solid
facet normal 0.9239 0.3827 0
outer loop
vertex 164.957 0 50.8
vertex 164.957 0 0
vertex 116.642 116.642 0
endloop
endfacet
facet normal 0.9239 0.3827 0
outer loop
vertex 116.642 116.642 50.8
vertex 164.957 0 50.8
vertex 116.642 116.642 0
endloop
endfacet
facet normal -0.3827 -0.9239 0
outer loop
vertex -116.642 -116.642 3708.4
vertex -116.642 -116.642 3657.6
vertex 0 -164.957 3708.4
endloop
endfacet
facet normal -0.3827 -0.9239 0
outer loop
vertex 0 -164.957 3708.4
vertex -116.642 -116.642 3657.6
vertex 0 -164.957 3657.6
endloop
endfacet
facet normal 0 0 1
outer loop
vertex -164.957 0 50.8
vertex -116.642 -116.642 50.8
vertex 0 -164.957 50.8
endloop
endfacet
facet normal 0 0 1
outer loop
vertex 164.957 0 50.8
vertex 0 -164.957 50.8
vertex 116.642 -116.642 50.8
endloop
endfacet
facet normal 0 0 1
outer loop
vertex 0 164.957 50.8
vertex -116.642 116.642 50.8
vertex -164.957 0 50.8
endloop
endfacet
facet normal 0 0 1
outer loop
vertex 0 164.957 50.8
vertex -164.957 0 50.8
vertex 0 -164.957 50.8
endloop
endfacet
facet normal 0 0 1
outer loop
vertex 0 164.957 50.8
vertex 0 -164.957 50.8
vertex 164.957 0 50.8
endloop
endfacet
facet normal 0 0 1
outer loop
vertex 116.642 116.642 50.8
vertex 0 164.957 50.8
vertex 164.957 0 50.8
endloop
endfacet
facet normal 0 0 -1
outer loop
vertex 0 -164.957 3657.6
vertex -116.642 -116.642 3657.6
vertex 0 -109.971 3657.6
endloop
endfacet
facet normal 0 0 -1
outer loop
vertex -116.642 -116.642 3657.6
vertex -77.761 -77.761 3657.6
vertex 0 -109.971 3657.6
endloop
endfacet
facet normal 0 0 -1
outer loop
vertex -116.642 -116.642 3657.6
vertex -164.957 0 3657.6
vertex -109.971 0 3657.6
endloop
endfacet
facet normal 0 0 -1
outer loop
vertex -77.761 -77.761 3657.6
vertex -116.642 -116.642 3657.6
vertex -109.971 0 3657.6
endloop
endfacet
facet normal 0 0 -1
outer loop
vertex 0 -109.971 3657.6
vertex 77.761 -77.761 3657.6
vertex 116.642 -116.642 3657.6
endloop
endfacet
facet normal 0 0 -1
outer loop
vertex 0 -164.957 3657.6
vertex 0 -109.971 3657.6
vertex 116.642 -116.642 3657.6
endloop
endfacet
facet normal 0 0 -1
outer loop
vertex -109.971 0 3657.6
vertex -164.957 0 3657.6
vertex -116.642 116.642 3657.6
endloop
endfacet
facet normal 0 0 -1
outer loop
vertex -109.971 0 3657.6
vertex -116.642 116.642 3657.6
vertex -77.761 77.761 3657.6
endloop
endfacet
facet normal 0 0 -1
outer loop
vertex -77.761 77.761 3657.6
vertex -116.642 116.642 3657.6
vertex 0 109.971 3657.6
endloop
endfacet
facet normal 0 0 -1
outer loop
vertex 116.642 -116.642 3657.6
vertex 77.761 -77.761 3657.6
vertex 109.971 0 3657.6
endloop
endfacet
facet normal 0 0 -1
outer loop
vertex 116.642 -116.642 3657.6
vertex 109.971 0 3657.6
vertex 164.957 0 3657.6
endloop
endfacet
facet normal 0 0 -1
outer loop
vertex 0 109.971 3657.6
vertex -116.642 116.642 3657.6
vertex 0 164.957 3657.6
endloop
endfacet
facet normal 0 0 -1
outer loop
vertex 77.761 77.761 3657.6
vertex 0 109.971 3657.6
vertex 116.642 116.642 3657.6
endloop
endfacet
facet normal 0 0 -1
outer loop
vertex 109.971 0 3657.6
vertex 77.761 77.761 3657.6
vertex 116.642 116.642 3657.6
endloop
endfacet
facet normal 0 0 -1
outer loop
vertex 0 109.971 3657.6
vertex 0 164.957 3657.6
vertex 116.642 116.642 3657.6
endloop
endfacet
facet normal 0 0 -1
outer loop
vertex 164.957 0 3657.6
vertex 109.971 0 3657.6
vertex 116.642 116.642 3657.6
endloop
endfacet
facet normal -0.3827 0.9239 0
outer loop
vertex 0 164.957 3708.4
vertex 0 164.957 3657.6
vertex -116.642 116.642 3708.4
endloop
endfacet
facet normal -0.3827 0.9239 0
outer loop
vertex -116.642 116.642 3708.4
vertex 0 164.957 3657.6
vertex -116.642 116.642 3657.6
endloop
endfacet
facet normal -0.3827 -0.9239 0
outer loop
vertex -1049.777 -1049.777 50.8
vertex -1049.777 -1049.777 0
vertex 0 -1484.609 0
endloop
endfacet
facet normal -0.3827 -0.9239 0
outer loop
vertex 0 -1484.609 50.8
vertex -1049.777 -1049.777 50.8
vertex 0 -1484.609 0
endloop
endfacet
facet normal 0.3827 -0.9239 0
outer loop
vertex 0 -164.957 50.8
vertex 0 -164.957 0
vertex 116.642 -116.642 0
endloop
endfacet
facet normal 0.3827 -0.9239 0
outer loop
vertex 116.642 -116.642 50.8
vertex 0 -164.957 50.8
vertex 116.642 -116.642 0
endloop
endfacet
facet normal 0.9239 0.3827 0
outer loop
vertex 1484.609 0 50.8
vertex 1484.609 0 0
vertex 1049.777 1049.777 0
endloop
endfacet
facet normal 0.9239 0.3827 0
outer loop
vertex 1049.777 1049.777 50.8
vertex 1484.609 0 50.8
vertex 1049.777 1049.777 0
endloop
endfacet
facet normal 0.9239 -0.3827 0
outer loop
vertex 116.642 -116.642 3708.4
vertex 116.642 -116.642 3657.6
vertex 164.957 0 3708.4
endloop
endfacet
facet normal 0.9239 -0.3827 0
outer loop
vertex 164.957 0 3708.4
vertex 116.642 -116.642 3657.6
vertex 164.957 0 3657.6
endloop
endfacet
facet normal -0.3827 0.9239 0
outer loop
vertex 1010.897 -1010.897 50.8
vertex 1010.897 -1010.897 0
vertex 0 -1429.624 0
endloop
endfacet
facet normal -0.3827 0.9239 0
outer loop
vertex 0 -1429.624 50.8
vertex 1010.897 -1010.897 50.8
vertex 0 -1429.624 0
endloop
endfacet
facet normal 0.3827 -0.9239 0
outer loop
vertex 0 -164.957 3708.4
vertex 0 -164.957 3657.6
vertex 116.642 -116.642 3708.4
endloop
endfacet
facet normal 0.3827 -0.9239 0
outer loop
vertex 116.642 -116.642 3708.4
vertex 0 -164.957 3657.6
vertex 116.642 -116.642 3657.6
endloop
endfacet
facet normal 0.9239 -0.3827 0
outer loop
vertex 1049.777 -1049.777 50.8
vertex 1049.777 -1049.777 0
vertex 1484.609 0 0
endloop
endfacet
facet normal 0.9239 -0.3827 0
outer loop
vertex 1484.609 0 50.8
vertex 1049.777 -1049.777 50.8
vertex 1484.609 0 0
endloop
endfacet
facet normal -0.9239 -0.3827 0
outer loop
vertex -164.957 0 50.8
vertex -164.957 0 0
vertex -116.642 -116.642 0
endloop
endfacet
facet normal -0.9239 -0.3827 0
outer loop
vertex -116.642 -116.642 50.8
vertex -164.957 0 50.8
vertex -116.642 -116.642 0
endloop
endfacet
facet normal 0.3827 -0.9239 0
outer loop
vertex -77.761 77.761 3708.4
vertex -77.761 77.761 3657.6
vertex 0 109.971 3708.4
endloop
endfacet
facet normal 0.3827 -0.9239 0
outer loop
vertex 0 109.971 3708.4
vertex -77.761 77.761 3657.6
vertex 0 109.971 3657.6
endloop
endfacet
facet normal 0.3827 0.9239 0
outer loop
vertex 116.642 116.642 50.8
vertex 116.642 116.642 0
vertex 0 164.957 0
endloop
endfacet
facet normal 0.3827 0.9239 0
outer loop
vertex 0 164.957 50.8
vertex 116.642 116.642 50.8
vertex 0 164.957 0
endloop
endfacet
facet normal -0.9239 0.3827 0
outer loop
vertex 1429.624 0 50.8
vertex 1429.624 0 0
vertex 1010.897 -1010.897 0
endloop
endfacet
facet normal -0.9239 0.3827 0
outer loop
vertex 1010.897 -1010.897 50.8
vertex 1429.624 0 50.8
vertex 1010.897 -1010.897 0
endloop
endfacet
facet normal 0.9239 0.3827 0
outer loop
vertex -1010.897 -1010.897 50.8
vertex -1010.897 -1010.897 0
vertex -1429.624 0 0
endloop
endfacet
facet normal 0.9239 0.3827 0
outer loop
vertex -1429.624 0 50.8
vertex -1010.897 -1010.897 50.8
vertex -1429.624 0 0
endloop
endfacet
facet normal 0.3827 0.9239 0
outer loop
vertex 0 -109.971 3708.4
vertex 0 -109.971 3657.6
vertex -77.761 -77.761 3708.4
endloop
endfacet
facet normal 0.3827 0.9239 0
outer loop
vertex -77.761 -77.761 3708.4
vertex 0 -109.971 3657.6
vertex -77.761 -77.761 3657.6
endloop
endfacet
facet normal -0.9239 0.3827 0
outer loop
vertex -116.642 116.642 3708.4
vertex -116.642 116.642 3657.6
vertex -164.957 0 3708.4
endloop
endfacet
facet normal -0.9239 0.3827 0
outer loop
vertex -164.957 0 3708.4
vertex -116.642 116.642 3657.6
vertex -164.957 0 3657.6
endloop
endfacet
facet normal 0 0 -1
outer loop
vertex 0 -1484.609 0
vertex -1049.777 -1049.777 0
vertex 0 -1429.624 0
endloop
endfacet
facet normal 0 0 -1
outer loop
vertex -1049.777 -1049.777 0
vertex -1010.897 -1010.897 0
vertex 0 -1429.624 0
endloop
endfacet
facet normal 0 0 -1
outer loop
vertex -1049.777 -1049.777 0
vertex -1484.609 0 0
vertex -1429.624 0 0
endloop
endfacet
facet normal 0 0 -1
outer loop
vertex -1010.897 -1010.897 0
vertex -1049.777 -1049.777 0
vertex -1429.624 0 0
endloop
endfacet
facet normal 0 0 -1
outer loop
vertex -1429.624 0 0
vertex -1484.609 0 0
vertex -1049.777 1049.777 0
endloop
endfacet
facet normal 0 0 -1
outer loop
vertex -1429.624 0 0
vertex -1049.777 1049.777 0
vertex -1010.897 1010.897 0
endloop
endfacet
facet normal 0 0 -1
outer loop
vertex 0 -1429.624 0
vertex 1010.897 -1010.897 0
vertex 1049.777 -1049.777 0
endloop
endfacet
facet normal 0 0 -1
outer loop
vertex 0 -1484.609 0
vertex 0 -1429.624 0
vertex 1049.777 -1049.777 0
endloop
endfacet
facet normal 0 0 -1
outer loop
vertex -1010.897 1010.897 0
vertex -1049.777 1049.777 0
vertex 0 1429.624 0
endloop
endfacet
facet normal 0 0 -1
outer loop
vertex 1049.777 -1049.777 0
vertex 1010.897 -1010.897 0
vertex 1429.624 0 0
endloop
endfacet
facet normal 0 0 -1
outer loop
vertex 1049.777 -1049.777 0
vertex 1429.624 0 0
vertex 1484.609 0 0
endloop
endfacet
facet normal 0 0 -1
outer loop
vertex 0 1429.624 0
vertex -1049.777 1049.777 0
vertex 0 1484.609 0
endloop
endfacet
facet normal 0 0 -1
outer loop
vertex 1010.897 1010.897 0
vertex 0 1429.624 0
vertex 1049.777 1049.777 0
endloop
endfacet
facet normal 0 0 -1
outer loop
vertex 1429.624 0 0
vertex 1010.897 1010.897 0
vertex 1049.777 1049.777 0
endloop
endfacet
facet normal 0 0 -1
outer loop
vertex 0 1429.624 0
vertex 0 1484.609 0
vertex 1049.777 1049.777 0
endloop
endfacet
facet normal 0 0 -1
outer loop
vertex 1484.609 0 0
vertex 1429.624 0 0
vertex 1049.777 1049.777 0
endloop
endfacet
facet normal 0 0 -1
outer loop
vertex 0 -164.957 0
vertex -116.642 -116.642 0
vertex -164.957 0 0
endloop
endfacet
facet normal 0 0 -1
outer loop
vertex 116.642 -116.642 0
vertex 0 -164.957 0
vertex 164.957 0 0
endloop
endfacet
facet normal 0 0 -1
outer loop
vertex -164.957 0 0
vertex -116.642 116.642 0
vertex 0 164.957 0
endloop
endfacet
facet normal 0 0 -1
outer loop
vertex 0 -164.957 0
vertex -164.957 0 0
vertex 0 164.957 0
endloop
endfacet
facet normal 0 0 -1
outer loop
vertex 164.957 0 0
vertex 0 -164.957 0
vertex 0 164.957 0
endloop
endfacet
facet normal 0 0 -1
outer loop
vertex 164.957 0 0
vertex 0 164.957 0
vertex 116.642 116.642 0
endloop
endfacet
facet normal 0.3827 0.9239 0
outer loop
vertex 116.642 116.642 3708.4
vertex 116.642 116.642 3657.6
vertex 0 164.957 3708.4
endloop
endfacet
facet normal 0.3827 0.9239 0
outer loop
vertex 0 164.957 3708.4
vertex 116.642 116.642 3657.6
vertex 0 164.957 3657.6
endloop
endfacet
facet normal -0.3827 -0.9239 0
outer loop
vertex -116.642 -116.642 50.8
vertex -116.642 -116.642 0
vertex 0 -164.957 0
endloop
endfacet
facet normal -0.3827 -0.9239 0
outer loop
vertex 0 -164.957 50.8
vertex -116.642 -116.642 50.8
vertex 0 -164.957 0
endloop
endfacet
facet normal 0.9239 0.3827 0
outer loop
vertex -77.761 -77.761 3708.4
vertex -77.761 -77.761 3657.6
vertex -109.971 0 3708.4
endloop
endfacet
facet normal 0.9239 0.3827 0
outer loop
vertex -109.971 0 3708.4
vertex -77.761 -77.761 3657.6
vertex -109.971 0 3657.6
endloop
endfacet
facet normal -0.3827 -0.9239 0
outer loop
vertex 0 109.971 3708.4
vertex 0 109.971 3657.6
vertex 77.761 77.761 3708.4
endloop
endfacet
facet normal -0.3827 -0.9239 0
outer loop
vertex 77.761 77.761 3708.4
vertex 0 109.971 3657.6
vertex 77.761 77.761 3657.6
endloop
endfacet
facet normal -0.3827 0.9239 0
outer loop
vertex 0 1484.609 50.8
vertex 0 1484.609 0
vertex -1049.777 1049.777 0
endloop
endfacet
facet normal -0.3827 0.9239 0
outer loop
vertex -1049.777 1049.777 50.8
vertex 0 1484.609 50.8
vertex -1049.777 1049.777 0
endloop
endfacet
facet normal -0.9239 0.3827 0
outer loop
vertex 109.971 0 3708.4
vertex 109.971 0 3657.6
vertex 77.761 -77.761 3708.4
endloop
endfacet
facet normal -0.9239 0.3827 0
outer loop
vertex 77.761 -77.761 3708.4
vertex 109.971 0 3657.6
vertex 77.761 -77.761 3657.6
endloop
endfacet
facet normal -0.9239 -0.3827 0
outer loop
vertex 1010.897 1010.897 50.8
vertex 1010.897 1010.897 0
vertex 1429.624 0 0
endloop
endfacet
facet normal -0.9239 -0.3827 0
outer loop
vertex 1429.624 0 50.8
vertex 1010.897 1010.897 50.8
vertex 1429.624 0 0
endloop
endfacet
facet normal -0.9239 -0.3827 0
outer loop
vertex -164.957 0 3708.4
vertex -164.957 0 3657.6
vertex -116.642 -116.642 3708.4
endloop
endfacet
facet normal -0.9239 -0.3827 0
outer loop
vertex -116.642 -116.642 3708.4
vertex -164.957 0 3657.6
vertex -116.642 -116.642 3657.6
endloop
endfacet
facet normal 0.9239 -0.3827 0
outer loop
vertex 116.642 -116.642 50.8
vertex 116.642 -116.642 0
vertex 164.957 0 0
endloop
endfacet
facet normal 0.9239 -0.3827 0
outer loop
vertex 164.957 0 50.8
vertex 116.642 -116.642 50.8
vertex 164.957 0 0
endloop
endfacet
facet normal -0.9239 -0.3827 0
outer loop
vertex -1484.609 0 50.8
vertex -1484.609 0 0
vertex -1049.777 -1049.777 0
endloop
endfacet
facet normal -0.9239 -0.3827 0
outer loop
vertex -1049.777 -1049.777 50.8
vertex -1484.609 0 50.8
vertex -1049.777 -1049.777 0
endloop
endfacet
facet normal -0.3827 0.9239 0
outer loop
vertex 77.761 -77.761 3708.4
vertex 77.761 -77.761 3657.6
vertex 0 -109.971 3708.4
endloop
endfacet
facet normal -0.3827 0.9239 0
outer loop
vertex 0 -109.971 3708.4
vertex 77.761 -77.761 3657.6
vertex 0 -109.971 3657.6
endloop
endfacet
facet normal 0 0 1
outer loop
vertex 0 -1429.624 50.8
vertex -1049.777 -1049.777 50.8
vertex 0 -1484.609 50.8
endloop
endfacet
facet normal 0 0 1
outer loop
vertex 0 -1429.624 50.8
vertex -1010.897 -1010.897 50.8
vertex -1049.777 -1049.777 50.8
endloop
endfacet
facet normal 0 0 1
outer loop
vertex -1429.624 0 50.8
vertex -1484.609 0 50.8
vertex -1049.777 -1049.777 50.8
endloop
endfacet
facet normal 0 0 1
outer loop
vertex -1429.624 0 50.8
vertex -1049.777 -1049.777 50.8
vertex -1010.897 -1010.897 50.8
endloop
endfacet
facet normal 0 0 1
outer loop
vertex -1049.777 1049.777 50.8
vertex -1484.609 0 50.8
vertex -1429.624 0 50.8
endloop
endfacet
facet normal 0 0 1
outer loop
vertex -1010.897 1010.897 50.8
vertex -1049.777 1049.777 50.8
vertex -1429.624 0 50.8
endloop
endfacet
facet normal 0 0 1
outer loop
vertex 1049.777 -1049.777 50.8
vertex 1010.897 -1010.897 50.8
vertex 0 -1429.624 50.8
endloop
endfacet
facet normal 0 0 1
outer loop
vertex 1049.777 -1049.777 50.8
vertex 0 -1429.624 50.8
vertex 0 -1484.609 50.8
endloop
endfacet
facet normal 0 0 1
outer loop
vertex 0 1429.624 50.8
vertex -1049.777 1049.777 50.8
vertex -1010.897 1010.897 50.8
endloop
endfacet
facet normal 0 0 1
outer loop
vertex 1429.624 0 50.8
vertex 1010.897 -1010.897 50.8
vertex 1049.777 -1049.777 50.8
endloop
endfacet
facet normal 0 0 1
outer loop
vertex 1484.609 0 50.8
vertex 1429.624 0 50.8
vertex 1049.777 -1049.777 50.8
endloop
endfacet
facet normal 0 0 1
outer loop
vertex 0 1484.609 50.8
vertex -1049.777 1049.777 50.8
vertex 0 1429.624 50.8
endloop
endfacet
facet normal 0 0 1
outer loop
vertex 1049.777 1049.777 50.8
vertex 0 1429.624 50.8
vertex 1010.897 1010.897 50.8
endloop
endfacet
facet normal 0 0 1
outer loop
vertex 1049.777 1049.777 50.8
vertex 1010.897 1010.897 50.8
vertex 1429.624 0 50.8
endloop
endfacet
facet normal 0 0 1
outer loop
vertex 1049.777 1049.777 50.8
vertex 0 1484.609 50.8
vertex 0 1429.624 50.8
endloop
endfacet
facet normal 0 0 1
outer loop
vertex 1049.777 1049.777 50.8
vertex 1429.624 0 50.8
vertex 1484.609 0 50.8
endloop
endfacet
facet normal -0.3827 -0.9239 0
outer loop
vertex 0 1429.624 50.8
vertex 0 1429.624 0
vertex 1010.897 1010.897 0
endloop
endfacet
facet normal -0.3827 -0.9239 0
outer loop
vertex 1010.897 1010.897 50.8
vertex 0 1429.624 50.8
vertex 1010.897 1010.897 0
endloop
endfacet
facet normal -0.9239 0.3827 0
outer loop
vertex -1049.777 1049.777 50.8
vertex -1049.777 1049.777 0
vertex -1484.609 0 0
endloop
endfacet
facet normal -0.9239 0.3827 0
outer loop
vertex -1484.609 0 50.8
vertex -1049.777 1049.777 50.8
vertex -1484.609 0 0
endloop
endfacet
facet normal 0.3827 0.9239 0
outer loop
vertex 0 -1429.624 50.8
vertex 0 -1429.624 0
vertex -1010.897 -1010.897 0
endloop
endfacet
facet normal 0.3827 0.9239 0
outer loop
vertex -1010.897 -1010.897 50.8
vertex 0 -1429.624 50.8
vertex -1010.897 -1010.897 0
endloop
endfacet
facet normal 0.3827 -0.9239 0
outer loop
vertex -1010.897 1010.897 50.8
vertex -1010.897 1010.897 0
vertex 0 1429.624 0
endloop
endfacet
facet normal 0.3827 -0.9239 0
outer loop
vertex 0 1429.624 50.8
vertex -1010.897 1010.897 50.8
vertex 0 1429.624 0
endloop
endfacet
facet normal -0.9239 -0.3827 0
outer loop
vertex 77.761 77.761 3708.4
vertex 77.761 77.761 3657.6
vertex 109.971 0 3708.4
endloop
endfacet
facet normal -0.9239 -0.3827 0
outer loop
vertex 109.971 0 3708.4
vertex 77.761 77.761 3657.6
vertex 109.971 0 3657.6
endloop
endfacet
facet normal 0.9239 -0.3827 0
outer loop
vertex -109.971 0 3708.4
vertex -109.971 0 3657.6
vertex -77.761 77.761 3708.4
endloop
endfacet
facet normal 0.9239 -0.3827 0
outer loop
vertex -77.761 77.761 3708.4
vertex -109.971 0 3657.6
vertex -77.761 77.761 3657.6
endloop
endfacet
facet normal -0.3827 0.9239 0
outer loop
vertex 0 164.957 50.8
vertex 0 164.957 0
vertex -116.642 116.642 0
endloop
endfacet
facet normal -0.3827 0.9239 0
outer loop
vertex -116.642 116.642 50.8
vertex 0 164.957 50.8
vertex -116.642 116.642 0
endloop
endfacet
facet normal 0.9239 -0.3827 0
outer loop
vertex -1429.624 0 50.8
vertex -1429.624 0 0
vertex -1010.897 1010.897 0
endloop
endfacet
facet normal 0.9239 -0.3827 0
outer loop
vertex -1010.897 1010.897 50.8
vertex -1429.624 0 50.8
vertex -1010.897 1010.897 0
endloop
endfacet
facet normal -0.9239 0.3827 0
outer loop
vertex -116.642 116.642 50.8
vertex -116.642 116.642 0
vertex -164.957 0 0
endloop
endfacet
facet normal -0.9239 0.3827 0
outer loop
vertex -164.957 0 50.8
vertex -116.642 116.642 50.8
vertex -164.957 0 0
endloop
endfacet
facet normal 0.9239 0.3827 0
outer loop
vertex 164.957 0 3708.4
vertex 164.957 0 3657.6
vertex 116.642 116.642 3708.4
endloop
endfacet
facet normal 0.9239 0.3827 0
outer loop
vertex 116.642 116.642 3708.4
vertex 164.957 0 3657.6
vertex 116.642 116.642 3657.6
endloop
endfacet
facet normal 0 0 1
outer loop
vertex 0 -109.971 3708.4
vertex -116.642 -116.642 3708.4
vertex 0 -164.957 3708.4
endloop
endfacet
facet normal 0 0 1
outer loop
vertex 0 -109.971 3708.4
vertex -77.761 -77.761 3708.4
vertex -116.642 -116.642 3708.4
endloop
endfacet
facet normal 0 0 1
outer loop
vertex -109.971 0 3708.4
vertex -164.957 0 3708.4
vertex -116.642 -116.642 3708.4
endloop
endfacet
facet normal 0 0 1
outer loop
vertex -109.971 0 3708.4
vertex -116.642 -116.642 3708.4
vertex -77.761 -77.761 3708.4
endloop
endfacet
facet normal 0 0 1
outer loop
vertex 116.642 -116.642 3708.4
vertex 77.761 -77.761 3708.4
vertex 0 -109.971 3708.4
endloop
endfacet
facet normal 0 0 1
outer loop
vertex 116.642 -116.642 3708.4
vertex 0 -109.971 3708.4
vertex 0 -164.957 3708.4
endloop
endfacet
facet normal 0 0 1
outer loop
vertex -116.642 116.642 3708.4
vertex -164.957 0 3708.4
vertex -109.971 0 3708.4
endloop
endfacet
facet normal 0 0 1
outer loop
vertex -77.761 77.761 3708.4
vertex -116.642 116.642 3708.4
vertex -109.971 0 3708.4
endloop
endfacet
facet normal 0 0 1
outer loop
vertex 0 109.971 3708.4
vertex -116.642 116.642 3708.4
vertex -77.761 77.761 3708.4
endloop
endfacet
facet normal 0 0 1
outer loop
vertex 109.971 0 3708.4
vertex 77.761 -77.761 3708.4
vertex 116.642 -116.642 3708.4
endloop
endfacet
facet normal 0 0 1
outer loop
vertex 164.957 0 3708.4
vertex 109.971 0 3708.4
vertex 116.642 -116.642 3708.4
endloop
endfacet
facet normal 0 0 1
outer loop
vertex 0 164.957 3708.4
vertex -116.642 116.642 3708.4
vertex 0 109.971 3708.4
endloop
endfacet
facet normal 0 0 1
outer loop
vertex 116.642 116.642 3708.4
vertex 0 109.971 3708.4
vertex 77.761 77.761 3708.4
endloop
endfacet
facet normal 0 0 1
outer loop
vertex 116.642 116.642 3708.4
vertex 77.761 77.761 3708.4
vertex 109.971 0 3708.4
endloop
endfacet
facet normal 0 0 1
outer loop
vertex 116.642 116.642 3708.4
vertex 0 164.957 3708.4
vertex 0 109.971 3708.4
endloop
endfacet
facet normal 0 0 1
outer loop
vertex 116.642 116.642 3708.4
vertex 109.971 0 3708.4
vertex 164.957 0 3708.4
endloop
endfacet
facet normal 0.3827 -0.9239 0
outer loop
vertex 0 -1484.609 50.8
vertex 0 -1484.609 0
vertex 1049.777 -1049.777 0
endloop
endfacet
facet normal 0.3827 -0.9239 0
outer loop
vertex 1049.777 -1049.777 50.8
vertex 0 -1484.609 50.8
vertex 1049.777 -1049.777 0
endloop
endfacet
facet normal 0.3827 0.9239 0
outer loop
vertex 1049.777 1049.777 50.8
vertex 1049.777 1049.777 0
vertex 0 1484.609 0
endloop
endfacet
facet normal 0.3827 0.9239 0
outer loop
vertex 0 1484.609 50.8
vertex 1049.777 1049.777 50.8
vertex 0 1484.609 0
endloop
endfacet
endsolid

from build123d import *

# Parameters (mm, degrees)
F1_DEPTH = 50.8
F4_DEPTH = 50.8
F6_DEPTH = 50.8


with BuildPart() as f1:
    # F0 (on Top) → F1 (new body)
    with BuildSketch(Plane.XY):
        Polygon((1049.777192, -1049.777192), (1484.609142, 0), (1049.777192, 1049.777192), (0, 1484.609142), (-1049.777192, 1049.777192), (-1484.609142, 0), (-1049.777192, -1049.777192), (0, -1484.609142), align=None)
        Polygon((-1010.896596, -1010.896596), (-1429.623677, 0), (-1010.896596, 1010.896596), (0, 1429.623677), (1010.896596, 1010.896596), (1429.623677, 0), (1010.896596, -1010.896596), (0, -1429.623677), align=None, mode=Mode.SUBTRACT)
    extrude(amount=F1_DEPTH)


with BuildPart() as f4:
    # F3 (on offset) → F4 (new body)
    with BuildSketch(Plane.XY.offset(3657.6)):
        Polygon((116.64191, -116.64191), (164.956571, 0), (116.64191, 116.64191), (0, 164.956571), (-116.64191, 116.64191), (-164.956571, 0), (-116.64191, -116.64191), (0, -164.956571), align=None)
        Polygon((-77.761273, -77.761273), (-109.971048, 0), (-77.761273, 77.761273), (0, 109.971048), (77.761273, 77.761273), (109.971048, 0), (77.761273, -77.761273), (0, -109.971048), align=None, mode=Mode.SUBTRACT)
    extrude(amount=F4_DEPTH)


with BuildPart() as f6:
    # F5 (on Top) → F6 (new body)
    with BuildSketch(Plane.XY):
        Polygon((116.64191, -116.64191), (164.956571, 0), (116.64191, 116.64191), (0, 164.956571), (-116.64191, 116.64191), (-164.956571, 0), (-116.64191, -116.64191), (0, -164.956571), align=None)
    extrude(amount=F6_DEPTH)


solid = Compound([f1.part, f4.part, f6.part])
